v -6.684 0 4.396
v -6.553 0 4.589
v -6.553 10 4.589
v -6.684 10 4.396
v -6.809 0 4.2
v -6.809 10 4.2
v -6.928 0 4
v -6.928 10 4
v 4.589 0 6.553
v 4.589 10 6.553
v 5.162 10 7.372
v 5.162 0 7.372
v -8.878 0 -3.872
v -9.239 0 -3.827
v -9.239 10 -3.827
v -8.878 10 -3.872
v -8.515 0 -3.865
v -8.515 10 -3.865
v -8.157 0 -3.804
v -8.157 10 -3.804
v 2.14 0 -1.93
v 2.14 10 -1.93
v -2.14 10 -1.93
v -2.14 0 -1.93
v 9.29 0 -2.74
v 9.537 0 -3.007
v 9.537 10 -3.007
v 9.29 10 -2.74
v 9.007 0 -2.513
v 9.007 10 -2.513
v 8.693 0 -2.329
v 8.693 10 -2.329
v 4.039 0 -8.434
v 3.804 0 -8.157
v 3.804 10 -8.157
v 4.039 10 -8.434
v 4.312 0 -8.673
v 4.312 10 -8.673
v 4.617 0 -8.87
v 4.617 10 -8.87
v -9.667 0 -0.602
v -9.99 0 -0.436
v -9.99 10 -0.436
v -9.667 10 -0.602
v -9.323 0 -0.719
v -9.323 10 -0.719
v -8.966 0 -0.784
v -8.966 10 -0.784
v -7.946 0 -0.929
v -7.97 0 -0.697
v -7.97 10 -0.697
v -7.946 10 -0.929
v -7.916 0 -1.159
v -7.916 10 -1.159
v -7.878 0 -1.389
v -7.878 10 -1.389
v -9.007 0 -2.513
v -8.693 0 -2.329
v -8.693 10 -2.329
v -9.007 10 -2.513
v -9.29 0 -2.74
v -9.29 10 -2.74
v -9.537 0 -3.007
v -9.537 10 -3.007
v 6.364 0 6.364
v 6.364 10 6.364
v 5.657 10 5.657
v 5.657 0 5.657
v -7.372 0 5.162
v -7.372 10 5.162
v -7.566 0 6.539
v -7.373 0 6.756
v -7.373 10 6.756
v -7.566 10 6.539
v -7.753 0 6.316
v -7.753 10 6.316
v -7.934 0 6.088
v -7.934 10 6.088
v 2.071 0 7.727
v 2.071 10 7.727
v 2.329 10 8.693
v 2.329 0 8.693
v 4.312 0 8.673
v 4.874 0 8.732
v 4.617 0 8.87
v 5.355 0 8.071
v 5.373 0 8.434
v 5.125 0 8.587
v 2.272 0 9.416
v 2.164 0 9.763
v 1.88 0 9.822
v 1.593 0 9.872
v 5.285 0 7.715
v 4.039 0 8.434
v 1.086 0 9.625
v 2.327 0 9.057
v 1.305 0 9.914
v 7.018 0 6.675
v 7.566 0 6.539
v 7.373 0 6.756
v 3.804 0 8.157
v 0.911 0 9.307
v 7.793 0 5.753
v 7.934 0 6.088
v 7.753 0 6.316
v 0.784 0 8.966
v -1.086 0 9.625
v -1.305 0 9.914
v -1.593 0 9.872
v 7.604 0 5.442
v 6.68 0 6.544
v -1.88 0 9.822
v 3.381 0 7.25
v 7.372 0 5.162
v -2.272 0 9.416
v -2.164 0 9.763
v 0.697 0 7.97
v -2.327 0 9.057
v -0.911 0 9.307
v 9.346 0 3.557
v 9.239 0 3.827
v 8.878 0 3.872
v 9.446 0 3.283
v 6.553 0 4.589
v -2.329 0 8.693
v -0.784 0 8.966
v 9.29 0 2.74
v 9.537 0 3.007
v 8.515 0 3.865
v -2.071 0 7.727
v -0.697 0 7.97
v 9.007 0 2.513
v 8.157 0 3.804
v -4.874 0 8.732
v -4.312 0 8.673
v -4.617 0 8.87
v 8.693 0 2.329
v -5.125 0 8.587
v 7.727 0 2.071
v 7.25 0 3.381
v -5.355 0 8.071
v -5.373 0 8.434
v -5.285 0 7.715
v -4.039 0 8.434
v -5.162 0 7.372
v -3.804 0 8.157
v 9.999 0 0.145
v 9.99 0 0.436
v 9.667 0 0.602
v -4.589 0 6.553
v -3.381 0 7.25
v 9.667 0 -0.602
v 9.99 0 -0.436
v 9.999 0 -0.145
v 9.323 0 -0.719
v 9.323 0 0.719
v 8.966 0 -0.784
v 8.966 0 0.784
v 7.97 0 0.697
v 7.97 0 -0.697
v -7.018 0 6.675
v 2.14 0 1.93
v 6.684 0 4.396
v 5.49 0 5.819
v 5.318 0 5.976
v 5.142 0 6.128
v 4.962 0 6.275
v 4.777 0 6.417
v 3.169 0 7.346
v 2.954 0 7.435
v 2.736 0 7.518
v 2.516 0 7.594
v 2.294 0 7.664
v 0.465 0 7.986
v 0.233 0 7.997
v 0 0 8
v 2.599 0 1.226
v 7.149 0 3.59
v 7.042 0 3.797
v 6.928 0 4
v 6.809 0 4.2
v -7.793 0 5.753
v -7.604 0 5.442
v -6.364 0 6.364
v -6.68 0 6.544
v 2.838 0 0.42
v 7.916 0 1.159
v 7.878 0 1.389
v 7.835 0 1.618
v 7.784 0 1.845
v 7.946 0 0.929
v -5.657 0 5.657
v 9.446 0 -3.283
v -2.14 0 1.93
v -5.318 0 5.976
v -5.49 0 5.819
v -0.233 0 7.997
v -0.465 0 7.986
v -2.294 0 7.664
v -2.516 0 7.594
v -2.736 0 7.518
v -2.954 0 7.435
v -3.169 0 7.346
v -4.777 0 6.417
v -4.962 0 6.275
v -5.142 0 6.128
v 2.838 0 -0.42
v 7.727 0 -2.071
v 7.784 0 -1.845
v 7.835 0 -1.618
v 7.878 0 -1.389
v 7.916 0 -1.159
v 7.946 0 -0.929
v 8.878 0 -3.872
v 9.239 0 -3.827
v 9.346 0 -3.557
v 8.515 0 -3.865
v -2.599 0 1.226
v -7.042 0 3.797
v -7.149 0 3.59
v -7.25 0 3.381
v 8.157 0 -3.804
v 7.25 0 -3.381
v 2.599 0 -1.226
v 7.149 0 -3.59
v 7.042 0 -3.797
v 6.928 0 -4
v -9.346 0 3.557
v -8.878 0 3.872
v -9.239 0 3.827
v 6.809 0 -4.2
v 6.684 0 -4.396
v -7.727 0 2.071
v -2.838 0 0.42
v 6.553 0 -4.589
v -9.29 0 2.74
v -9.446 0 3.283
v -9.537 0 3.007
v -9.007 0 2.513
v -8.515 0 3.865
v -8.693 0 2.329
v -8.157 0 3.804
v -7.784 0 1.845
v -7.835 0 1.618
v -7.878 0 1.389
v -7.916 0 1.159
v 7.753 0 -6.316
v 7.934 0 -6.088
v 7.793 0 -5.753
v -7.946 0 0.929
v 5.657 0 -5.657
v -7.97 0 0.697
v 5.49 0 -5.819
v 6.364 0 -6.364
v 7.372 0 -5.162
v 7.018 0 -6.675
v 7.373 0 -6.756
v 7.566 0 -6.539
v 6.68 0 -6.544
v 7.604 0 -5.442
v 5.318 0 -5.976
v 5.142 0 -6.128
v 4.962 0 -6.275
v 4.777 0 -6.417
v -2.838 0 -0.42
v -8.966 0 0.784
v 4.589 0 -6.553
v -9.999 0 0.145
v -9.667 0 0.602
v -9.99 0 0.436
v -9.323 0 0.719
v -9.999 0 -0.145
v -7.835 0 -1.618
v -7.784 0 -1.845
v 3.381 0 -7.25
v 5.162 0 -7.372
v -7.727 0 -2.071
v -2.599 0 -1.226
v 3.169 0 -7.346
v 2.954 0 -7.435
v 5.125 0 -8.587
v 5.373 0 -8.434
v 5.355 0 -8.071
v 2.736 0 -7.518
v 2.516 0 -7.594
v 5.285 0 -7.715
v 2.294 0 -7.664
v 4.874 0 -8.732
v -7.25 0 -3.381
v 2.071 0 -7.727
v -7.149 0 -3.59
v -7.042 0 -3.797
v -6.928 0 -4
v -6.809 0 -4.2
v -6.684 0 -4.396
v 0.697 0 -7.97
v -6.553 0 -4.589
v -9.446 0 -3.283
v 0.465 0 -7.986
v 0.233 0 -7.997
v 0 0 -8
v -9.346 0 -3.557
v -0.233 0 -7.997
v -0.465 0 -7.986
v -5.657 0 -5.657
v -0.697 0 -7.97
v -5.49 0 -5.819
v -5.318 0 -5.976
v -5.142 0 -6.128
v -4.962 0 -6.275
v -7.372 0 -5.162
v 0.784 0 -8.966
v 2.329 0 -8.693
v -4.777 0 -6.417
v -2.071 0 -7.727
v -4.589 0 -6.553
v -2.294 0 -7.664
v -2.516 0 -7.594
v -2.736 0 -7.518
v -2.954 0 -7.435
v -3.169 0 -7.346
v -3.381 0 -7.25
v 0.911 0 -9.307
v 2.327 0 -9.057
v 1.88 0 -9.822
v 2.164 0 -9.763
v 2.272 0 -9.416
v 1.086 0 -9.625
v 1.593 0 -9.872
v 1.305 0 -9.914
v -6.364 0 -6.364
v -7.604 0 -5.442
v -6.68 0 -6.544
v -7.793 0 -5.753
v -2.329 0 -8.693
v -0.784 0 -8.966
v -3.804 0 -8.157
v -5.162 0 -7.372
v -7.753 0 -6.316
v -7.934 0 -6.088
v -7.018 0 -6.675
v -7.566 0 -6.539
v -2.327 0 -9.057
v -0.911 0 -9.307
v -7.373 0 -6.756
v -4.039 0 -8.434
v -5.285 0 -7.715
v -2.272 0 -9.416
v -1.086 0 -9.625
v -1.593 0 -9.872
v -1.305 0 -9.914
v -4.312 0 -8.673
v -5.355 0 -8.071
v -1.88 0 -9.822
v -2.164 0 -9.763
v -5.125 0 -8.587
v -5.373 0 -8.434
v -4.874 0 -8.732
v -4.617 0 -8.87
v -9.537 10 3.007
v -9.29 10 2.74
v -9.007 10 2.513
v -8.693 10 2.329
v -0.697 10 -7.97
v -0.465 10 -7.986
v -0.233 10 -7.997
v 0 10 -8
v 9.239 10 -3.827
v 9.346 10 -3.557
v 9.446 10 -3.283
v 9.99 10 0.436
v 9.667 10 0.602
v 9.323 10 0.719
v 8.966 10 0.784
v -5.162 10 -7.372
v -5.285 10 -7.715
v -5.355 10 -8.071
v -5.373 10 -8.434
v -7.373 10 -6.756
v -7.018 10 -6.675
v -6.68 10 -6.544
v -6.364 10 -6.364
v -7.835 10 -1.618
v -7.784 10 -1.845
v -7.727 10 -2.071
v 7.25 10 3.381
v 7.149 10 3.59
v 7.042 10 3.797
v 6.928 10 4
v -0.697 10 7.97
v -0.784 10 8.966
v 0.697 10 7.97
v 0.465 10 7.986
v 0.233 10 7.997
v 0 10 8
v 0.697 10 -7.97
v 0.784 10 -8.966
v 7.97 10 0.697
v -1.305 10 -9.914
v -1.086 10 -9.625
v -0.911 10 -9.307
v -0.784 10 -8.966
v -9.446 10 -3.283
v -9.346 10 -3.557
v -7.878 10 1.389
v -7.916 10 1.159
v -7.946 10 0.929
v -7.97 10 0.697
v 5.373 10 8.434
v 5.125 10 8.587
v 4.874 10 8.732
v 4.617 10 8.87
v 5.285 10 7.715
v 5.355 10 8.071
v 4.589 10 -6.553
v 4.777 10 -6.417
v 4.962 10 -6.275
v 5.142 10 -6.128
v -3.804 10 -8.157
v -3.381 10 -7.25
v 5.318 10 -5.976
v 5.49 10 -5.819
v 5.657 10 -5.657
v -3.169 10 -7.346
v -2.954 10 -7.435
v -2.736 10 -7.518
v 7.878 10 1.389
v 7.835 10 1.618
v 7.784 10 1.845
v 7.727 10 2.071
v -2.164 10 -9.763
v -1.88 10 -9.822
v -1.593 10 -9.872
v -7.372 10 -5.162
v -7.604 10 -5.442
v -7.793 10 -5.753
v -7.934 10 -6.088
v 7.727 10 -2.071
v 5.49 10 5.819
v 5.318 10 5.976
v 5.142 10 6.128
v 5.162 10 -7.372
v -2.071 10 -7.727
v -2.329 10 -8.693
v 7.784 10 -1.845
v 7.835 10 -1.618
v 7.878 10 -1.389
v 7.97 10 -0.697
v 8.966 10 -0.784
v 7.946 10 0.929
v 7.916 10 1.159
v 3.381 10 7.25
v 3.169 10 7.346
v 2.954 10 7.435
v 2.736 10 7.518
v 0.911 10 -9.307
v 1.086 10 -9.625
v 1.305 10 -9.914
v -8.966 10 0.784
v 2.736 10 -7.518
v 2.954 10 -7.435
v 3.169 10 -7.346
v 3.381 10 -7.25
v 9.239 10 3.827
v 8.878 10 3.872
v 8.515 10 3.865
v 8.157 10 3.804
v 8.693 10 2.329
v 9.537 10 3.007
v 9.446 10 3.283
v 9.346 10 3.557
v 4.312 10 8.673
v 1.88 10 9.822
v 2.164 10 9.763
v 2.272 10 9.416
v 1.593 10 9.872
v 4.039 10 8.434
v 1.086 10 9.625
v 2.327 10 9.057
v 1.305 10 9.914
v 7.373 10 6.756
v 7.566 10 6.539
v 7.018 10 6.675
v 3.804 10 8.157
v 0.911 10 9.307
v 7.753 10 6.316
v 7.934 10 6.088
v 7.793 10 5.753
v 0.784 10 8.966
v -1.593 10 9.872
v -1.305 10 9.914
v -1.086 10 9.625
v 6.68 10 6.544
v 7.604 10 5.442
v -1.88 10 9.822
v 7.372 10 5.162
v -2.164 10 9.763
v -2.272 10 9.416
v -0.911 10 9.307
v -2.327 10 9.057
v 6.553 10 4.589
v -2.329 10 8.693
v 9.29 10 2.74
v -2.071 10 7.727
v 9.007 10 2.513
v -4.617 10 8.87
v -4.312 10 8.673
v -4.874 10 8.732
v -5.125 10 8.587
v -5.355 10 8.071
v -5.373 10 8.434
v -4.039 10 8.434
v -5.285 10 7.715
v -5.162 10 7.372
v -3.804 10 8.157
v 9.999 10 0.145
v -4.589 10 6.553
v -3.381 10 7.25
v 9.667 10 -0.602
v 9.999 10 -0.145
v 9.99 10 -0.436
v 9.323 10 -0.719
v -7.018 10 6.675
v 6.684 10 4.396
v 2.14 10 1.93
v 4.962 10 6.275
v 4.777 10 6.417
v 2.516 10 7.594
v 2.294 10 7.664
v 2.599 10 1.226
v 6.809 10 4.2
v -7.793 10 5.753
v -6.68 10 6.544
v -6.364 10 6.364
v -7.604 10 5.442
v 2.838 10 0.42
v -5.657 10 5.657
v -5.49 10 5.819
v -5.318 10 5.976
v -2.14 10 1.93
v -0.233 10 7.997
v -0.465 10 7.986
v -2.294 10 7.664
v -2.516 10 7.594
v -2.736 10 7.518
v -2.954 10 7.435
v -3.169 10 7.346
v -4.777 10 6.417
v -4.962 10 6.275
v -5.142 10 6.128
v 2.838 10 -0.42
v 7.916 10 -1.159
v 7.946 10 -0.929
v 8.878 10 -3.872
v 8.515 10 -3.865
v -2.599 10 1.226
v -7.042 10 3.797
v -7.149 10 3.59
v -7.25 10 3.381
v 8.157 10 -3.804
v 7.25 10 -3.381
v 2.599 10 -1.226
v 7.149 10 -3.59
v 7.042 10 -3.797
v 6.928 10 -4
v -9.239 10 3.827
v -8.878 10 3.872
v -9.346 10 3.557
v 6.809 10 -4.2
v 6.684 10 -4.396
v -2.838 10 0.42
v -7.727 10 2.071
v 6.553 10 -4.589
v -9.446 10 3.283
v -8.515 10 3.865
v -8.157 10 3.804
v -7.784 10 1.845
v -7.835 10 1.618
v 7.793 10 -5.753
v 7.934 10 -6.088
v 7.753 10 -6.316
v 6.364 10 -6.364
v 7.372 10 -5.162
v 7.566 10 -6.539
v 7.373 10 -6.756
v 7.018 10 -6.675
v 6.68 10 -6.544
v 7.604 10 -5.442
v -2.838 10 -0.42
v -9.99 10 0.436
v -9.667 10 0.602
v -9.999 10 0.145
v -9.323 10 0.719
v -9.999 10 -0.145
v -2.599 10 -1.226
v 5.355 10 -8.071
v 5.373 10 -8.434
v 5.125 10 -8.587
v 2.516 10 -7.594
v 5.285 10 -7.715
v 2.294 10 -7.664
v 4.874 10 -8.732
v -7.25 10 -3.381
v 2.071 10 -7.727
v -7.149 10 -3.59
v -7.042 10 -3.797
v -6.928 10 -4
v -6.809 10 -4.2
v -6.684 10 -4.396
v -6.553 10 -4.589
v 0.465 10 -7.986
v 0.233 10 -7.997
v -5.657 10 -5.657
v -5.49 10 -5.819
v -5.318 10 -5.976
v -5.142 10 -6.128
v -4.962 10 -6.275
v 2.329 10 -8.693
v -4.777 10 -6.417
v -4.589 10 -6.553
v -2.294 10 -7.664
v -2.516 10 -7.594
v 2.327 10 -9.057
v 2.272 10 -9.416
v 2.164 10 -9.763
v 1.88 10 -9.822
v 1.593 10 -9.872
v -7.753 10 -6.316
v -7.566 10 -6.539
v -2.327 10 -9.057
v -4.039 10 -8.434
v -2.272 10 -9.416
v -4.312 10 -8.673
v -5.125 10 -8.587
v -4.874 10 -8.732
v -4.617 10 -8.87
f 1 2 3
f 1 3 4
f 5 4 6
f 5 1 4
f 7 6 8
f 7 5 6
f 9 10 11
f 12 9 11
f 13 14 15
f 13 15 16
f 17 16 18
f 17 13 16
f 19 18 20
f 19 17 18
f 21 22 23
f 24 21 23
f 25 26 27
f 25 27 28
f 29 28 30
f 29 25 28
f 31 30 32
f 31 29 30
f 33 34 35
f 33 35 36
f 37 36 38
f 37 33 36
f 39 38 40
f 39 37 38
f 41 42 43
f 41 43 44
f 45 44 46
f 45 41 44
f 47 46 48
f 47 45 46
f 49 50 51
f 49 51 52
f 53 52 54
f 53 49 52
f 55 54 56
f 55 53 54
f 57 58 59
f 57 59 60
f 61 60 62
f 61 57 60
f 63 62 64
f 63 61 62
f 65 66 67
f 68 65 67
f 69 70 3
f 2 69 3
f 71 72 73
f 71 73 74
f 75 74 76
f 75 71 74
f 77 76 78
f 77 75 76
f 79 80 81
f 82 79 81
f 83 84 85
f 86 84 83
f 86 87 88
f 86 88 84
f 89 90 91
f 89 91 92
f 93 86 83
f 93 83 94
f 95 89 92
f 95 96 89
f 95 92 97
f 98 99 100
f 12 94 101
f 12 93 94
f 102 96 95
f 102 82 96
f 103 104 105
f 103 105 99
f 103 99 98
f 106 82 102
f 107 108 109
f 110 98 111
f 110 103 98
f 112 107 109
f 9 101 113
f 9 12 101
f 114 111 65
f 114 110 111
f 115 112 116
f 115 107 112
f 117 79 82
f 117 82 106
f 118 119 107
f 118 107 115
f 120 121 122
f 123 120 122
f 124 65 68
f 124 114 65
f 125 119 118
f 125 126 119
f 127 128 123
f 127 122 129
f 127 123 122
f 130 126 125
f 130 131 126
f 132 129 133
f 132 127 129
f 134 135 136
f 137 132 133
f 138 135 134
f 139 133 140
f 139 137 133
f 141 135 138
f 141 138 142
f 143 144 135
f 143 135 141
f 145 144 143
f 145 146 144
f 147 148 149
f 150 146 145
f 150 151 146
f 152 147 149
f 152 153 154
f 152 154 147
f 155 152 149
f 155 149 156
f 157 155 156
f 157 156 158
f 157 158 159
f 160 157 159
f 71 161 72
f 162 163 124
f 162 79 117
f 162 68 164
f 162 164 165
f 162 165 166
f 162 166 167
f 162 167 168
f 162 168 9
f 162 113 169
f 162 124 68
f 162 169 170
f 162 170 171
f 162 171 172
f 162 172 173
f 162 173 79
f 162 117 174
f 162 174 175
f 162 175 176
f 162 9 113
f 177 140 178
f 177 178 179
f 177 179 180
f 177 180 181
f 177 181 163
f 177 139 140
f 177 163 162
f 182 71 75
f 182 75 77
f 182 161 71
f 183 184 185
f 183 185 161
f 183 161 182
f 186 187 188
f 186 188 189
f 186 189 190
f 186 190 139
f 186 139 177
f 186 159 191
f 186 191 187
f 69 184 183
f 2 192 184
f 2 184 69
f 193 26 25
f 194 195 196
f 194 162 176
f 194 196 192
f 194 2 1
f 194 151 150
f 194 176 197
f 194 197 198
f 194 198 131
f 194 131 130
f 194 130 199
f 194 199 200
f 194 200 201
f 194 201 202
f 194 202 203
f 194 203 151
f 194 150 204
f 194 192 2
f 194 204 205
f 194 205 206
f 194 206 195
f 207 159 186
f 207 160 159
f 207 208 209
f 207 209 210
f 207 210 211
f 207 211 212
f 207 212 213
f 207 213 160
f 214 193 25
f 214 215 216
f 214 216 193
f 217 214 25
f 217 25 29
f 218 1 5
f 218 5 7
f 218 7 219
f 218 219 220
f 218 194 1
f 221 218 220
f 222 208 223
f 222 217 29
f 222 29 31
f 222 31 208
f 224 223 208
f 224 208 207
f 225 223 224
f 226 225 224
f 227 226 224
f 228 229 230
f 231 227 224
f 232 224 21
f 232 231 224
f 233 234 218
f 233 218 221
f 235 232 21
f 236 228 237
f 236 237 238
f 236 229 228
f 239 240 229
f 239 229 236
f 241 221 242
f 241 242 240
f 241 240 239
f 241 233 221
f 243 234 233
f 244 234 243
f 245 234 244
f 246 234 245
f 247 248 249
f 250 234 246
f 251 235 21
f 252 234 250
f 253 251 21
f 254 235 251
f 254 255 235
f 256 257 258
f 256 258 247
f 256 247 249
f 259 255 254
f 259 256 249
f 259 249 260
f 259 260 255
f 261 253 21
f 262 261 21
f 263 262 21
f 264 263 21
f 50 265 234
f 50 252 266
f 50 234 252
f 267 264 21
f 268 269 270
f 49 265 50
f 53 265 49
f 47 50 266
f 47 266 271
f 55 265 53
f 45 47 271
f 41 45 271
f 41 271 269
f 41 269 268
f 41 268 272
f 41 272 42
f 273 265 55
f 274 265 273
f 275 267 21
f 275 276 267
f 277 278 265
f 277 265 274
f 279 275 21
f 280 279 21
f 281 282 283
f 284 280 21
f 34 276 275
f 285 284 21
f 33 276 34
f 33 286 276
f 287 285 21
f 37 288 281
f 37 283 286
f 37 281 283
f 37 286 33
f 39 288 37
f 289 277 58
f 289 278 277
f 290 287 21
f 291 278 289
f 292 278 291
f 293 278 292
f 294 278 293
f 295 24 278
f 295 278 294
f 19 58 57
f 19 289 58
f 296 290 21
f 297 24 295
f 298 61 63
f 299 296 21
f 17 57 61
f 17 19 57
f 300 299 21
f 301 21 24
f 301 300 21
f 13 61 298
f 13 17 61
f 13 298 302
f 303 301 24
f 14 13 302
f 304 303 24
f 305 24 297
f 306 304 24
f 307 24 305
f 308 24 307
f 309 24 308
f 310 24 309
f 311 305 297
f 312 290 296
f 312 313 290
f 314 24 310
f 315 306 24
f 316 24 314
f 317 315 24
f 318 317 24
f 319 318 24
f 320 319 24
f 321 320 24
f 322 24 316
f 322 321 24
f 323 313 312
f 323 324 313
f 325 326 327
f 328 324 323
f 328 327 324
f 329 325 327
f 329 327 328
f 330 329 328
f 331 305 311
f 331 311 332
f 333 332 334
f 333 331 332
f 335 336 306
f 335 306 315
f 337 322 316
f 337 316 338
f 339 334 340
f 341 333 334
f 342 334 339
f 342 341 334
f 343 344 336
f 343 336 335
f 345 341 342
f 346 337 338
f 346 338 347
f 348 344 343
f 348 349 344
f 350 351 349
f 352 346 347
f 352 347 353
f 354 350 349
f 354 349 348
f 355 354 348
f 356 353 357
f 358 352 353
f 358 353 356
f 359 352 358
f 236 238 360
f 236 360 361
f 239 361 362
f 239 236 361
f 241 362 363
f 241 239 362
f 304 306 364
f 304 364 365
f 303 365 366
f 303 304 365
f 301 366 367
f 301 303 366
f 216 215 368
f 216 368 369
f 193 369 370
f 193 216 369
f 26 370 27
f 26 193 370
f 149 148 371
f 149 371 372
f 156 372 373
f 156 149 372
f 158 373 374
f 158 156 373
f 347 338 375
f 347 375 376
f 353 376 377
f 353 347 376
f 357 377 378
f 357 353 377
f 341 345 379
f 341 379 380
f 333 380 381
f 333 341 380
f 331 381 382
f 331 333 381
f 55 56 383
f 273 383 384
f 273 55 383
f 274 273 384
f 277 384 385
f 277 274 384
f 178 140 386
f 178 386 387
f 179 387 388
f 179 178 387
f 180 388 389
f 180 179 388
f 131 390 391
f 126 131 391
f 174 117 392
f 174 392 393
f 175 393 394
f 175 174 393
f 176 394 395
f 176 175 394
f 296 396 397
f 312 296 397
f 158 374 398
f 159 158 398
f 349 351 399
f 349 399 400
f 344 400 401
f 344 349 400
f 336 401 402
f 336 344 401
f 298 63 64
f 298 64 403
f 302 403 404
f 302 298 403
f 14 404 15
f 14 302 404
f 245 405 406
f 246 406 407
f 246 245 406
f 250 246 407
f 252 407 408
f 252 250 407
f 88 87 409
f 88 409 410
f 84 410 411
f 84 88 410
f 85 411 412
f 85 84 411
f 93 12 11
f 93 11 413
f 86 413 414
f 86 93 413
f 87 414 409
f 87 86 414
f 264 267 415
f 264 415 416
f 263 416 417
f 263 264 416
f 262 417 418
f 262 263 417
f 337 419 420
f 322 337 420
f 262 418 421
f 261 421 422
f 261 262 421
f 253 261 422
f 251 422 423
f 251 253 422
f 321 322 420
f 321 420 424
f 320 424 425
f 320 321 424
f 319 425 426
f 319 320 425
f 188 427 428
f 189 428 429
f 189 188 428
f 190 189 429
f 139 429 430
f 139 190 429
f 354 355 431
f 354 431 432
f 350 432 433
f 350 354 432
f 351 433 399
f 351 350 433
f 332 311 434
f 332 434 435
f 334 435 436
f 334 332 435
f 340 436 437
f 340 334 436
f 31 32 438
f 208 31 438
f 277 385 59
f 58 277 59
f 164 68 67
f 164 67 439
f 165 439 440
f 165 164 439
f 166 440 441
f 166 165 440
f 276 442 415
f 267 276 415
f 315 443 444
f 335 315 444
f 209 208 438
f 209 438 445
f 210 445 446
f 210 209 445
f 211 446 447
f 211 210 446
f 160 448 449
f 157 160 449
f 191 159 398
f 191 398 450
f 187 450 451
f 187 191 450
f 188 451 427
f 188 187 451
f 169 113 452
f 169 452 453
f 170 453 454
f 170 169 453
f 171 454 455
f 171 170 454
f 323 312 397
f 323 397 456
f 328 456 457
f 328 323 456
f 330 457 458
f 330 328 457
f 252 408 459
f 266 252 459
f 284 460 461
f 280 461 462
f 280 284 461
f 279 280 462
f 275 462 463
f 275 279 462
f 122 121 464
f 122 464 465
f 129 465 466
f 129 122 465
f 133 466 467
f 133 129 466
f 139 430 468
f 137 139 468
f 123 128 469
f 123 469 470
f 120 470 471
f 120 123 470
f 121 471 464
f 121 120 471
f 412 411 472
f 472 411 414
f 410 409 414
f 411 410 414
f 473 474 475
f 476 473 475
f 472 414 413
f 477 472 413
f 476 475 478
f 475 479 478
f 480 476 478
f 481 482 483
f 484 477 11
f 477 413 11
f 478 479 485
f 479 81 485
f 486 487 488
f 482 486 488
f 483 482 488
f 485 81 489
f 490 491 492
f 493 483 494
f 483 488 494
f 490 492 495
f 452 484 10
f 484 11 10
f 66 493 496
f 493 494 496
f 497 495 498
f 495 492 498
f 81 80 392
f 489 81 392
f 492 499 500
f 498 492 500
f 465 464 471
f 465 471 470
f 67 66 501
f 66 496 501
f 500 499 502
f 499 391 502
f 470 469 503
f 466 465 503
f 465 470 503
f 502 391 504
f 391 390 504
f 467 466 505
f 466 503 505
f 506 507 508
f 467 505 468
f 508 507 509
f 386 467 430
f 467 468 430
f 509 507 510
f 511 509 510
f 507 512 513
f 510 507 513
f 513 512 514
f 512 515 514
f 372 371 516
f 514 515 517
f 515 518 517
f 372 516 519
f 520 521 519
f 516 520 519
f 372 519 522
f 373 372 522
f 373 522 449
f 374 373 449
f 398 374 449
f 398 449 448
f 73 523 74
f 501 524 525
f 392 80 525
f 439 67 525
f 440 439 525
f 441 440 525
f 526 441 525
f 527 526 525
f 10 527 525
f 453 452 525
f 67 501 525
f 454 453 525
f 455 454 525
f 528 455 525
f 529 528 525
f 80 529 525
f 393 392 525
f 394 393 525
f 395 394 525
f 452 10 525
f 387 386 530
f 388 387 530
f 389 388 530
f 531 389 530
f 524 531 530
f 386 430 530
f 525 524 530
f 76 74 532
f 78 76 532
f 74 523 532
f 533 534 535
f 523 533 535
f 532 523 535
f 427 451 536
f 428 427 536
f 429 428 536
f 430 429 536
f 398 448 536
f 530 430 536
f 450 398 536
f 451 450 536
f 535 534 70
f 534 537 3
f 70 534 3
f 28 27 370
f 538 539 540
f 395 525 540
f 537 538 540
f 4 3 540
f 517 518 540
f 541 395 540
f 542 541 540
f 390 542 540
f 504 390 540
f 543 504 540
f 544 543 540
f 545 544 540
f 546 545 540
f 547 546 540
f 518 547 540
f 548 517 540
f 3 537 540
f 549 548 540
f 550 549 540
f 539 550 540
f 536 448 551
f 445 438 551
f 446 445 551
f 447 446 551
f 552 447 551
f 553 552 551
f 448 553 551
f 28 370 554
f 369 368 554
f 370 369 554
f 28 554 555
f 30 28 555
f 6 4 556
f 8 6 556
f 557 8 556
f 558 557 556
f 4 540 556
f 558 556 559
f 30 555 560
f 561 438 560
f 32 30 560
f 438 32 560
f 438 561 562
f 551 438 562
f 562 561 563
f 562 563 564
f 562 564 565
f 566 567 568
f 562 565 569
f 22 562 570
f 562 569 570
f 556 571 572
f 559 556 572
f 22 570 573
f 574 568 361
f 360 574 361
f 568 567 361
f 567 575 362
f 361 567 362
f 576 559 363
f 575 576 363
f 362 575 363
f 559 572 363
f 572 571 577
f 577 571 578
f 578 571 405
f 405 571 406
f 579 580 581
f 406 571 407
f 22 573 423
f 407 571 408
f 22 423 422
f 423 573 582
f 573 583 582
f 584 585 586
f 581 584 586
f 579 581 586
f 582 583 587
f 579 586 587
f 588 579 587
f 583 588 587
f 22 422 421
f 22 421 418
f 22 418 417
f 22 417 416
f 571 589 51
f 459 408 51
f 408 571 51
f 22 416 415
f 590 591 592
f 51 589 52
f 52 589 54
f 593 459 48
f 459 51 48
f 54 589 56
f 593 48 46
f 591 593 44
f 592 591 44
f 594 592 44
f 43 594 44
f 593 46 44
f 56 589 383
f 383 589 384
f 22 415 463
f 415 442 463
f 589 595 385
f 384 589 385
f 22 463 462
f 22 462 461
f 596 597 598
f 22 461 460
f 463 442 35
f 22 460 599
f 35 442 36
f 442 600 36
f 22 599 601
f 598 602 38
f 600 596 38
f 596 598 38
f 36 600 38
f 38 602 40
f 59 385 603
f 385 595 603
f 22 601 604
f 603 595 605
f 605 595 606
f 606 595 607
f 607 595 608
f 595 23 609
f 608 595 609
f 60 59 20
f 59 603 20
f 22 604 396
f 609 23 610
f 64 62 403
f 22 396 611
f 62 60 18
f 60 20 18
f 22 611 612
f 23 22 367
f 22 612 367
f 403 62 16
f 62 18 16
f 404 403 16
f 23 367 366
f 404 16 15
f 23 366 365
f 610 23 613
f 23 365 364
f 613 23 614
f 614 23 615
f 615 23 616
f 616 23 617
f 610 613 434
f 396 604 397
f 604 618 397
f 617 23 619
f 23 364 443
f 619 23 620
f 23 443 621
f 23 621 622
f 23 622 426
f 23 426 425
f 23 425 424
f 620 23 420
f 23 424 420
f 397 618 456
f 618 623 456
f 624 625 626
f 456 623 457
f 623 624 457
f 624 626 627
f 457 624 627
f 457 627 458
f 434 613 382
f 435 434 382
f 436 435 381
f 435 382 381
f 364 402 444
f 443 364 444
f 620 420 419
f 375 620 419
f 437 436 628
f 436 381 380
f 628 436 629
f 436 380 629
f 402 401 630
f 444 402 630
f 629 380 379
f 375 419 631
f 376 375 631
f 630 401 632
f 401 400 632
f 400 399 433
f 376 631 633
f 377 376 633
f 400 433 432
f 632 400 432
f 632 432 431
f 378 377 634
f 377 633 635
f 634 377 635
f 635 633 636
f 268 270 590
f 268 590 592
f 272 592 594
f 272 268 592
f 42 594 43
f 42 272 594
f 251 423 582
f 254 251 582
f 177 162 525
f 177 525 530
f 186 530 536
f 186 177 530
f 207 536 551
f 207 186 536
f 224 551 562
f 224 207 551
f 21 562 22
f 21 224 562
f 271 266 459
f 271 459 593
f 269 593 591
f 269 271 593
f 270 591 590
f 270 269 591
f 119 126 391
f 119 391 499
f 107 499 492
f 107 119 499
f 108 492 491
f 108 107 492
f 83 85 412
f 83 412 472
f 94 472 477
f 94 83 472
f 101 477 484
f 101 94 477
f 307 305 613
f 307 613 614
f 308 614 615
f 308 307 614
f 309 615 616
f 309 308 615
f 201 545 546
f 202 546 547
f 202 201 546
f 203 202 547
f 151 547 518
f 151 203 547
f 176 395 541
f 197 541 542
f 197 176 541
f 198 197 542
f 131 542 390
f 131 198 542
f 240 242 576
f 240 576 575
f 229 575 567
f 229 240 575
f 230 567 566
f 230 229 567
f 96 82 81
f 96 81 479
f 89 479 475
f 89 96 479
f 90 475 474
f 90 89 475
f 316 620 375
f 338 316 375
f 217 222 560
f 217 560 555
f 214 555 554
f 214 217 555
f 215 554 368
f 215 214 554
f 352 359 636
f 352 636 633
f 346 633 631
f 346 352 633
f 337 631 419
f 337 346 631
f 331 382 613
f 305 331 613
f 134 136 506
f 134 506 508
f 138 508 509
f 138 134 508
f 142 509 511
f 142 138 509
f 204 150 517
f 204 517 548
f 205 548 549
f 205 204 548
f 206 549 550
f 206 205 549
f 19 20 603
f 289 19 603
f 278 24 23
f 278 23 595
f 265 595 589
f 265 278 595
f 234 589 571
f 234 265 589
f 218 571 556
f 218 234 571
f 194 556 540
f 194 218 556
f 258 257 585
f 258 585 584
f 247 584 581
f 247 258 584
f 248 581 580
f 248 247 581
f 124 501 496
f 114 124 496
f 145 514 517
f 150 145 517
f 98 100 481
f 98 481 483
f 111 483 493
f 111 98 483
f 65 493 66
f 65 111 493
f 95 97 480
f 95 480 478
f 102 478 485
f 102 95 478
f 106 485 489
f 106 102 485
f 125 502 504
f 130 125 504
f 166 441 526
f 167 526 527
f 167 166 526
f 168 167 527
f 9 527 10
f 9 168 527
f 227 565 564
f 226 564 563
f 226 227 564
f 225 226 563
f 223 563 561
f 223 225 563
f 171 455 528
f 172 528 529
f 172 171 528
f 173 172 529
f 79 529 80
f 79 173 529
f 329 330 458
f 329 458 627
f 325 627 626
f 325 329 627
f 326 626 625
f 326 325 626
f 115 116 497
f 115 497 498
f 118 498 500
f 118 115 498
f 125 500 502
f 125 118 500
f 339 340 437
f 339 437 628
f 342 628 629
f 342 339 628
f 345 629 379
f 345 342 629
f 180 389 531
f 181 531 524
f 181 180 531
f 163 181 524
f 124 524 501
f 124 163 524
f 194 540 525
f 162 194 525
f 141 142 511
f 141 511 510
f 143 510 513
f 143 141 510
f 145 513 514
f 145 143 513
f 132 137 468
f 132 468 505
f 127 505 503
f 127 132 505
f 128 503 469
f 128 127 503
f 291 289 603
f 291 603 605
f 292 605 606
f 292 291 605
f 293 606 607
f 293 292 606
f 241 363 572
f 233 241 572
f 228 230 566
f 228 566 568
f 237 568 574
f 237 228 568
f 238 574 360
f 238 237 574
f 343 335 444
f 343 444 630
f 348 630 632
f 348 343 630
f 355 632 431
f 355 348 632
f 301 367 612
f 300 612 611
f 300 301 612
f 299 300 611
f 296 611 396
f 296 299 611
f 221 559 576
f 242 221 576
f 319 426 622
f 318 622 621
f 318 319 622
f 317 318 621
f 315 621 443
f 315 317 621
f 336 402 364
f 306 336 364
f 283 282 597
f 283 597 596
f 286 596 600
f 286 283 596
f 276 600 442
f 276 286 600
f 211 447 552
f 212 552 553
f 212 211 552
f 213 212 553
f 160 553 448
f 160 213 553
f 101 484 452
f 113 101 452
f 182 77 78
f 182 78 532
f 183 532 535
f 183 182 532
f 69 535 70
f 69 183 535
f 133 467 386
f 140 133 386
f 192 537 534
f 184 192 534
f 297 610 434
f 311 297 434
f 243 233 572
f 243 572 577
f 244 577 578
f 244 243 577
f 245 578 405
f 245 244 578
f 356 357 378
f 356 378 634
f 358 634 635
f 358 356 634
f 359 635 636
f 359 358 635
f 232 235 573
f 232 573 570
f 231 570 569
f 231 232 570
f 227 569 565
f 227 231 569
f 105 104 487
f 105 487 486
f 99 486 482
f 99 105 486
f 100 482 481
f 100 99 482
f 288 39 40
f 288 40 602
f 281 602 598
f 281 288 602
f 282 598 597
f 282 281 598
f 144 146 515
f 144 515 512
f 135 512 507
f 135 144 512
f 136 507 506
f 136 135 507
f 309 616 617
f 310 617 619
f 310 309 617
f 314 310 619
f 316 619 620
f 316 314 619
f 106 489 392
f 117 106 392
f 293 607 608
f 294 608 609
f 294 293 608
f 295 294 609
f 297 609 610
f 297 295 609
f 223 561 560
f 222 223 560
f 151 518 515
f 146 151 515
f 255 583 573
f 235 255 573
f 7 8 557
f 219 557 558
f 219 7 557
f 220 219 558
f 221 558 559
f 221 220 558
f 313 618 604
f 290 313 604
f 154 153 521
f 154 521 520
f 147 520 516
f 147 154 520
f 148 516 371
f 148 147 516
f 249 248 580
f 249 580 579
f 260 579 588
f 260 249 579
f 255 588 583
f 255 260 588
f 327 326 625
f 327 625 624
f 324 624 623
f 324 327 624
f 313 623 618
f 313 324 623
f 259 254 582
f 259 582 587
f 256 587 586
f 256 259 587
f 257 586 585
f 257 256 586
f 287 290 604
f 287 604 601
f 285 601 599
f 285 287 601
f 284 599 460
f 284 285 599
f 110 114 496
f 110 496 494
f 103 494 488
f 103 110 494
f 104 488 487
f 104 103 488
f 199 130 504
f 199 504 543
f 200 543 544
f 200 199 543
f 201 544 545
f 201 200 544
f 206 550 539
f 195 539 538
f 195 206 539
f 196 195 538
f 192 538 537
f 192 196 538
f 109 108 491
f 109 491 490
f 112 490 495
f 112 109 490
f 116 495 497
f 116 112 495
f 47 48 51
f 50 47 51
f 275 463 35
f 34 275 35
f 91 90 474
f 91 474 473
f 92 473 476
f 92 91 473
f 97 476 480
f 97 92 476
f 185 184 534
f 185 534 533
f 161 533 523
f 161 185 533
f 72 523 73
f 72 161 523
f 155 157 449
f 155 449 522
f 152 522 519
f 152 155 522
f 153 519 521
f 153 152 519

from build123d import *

# Parameters (mm, degrees)
BOSS_EXTRUDE1_DEPTH = 10
CIRPATTERN1_COUNT   = 18
CUT_EXTRUDE1_DEPTH  = 18.271256217


with BuildPart() as part:
    # Sketch1 → Boss-Extrude1 (new body)
    with BuildSketch(Plane(origin=(0, 0, 0), x_dir=(1, 0, 0), z_dir=(0, 1, 0))):
        with BuildLine():
            Line((7.969557585, 0.697245942), (8.965752283, 0.784401685))
            ThreePointArc((8.965752283, 0.784401685), (9.497437113, 0.667153604), (9.990482216, 0.436193874))
            ThreePointArc((9.990482216, 0.436193874), (10, 0), (9.990482216, -0.436193874))
            ThreePointArc((9.990482216, -0.436193874), (9.497437113, -0.667153604), (8.965752283, -0.784401685))
            Line((8.965752283, -0.784401685), (7.969557585, -0.697245942))
            ThreePointArc((7.969557585, -0.697245942), (7.931558891, -1.044209538), (7.878462024, -1.389185421))
            Line((7.878462024, -1.389185421), (0, 0))
            Line((0, 0), (7.878462024, 1.389185421))
            ThreePointArc((7.878462024, 1.389185421), (7.931558891, 1.044209538), (7.969557585, 0.697245942))
        make_face()
    boss_extrude1 = extrude(amount=BOSS_EXTRUDE1_DEPTH)

    # CirPattern1: Boss-Extrude1 ×18 about axis
    cirpattern1_axis = Axis((0, 0, 0), (0, 1, 0))
    for i in range(1, CIRPATTERN1_COUNT):
        add(boss_extrude1.rotate(cirpattern1_axis, i * 360 / CIRPATTERN1_COUNT))

    # Sketch6 → Cut-Extrude1 (cut, through all)
    with BuildSketch(Plane.XZ):
        with BuildLine():
            Line((-2.14, 1.93), (2.14, 1.93))
            ThreePointArc((2.14, 1.93), (2.868460939, 0), (2.14, -1.93))
            Line((2.14, -1.93), (-2.14, -1.93))
            ThreePointArc((-2.14, -1.93), (-2.868460939, 0), (-2.14, 1.93))
        make_face()
    extrude(amount=-CUT_EXTRUDE1_DEPTH, mode=Mode.SUBTRACT)


solid = part.part
